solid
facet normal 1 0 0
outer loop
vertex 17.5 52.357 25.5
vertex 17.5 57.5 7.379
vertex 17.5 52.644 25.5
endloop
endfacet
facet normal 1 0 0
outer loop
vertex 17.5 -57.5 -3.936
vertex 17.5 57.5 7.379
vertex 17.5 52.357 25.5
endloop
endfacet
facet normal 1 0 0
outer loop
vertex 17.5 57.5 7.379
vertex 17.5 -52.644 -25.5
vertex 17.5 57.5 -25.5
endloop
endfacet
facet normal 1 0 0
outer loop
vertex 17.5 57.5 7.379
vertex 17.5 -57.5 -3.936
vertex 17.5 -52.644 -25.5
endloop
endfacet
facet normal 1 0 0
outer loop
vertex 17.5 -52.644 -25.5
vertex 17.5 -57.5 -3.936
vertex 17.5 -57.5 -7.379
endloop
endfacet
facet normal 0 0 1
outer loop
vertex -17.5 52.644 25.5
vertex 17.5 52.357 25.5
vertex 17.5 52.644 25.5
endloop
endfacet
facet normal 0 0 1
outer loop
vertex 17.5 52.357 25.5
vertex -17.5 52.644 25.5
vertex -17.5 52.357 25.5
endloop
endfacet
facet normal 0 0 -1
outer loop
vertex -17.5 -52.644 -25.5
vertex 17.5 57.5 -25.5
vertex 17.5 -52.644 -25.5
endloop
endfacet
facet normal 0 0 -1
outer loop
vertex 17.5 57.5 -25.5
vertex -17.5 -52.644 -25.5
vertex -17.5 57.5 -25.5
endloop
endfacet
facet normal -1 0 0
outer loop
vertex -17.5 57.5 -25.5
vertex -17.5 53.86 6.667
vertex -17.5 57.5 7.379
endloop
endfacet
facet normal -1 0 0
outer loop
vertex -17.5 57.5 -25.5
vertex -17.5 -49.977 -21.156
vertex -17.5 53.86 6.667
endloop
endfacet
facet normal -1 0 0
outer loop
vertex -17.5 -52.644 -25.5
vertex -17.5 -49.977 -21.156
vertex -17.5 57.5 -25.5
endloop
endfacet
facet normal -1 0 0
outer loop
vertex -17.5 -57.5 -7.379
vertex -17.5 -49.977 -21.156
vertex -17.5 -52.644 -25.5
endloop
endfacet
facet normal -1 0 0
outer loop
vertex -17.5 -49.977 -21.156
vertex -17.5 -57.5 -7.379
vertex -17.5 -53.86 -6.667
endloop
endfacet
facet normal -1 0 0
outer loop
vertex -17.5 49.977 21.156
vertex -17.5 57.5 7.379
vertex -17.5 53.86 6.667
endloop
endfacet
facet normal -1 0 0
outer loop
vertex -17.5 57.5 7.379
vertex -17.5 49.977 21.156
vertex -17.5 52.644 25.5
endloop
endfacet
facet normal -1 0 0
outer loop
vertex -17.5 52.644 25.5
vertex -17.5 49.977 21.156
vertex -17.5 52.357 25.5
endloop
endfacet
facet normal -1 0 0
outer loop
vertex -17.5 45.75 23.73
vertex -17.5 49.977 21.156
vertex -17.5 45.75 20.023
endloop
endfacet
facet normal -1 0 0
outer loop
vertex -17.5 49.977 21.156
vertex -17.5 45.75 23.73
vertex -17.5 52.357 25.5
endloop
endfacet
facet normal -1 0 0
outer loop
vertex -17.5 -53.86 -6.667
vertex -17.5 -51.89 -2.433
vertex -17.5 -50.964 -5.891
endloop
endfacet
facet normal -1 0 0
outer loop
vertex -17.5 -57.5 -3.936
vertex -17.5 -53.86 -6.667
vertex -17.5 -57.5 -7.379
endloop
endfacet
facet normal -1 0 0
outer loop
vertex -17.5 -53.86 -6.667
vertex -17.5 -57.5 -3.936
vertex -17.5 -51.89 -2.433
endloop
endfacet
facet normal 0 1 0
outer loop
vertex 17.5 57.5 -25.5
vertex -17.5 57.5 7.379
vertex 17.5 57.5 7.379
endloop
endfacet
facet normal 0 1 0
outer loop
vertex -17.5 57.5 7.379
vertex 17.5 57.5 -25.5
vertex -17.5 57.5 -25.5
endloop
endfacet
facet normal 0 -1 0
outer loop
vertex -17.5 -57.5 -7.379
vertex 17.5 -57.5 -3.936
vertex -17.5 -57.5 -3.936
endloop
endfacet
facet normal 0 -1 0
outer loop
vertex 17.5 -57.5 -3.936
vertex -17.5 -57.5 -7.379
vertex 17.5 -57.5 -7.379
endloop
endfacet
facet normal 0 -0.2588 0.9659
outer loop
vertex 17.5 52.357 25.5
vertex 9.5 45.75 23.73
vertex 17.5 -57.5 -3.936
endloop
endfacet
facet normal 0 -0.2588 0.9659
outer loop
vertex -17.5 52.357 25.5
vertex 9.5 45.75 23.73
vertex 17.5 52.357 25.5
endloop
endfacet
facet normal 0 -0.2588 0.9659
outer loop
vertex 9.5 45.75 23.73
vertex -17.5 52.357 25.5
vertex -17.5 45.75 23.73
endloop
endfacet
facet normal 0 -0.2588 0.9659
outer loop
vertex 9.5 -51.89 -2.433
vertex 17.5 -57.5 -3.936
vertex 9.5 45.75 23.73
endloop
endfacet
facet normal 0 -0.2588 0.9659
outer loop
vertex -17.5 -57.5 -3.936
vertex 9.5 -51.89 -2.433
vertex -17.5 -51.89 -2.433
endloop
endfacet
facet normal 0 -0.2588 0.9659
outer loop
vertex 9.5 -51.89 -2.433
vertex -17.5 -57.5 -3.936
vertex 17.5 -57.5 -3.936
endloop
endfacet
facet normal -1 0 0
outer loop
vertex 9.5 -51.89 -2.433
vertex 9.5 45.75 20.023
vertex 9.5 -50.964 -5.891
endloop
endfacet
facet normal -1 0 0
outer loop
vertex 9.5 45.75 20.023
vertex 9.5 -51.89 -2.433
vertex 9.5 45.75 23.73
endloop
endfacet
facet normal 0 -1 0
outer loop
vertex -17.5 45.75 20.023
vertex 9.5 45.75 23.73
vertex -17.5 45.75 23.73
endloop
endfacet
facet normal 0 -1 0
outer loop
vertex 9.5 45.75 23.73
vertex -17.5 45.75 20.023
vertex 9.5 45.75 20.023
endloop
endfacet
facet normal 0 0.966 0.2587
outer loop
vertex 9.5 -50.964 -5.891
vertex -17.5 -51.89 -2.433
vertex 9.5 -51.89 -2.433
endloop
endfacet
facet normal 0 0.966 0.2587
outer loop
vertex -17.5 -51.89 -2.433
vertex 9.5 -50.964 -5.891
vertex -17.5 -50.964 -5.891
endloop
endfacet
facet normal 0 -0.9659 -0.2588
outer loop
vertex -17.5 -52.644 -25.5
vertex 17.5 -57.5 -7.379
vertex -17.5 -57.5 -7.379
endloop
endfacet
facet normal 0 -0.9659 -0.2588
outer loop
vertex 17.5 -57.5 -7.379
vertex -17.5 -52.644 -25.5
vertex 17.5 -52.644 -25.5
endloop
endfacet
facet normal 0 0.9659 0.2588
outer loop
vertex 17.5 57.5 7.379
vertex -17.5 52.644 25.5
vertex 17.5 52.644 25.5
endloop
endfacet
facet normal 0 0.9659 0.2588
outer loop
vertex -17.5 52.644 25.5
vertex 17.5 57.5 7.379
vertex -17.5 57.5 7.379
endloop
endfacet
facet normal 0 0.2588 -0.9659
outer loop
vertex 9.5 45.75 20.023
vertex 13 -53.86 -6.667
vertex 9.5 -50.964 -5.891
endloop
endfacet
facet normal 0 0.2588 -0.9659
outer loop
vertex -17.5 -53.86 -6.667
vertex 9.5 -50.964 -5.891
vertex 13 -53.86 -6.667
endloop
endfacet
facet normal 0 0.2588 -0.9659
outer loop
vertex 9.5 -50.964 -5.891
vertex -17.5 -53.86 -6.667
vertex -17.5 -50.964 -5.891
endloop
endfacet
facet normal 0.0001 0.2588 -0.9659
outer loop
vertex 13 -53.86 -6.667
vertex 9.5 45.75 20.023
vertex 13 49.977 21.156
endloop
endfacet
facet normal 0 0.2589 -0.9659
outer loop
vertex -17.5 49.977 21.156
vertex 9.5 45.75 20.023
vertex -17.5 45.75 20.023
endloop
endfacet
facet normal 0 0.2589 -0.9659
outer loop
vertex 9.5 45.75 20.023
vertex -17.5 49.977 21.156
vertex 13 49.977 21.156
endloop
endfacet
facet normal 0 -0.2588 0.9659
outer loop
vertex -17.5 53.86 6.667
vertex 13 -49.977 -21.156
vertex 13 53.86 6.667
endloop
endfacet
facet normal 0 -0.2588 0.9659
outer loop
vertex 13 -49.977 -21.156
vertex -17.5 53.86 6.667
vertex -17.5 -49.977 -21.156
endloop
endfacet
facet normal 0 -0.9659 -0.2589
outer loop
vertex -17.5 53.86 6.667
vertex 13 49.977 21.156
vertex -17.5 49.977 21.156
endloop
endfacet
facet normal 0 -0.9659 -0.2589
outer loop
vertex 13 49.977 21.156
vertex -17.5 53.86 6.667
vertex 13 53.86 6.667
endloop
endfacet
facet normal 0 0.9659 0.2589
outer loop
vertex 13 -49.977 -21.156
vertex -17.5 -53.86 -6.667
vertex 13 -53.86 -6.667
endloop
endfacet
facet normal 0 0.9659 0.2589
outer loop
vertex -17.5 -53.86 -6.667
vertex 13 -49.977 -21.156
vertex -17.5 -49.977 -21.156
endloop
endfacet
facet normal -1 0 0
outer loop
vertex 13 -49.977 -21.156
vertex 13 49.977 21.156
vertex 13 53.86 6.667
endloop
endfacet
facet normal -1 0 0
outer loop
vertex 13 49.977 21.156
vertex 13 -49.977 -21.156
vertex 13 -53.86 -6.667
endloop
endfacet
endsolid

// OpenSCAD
$fn=60;

inclination = 15;

// grouping for printing
difference() {
    // body
    cube([35, 115, 51], true);

    // top cutoff
    translate([0, 0, 27])
    rotate([inclination,0,0])
    cube([37, 150, 30], true);

    // inner cutoff
    translate([-8, -8, 17])
    cube([35, 107.5, 25], true);
    translate([-8, -28, 5])
    rotate([inclination,0,0])
    cube([35, 50, 25], true);

    // front cutoff
    translate([0, -80, -20])
    rotate([inclination,0,0])
    cube([37, 50, 25], true);

    // back cutoff
    translate([0, 80, 20])
    rotate([inclination,0,0])
    cube([37, 50, 25], true);

    // keyboard cutoff
    translate([-4.5, 0, 0])
    rotate([inclination,0,0])
    cube([35, 107.5, 15], true);
}
